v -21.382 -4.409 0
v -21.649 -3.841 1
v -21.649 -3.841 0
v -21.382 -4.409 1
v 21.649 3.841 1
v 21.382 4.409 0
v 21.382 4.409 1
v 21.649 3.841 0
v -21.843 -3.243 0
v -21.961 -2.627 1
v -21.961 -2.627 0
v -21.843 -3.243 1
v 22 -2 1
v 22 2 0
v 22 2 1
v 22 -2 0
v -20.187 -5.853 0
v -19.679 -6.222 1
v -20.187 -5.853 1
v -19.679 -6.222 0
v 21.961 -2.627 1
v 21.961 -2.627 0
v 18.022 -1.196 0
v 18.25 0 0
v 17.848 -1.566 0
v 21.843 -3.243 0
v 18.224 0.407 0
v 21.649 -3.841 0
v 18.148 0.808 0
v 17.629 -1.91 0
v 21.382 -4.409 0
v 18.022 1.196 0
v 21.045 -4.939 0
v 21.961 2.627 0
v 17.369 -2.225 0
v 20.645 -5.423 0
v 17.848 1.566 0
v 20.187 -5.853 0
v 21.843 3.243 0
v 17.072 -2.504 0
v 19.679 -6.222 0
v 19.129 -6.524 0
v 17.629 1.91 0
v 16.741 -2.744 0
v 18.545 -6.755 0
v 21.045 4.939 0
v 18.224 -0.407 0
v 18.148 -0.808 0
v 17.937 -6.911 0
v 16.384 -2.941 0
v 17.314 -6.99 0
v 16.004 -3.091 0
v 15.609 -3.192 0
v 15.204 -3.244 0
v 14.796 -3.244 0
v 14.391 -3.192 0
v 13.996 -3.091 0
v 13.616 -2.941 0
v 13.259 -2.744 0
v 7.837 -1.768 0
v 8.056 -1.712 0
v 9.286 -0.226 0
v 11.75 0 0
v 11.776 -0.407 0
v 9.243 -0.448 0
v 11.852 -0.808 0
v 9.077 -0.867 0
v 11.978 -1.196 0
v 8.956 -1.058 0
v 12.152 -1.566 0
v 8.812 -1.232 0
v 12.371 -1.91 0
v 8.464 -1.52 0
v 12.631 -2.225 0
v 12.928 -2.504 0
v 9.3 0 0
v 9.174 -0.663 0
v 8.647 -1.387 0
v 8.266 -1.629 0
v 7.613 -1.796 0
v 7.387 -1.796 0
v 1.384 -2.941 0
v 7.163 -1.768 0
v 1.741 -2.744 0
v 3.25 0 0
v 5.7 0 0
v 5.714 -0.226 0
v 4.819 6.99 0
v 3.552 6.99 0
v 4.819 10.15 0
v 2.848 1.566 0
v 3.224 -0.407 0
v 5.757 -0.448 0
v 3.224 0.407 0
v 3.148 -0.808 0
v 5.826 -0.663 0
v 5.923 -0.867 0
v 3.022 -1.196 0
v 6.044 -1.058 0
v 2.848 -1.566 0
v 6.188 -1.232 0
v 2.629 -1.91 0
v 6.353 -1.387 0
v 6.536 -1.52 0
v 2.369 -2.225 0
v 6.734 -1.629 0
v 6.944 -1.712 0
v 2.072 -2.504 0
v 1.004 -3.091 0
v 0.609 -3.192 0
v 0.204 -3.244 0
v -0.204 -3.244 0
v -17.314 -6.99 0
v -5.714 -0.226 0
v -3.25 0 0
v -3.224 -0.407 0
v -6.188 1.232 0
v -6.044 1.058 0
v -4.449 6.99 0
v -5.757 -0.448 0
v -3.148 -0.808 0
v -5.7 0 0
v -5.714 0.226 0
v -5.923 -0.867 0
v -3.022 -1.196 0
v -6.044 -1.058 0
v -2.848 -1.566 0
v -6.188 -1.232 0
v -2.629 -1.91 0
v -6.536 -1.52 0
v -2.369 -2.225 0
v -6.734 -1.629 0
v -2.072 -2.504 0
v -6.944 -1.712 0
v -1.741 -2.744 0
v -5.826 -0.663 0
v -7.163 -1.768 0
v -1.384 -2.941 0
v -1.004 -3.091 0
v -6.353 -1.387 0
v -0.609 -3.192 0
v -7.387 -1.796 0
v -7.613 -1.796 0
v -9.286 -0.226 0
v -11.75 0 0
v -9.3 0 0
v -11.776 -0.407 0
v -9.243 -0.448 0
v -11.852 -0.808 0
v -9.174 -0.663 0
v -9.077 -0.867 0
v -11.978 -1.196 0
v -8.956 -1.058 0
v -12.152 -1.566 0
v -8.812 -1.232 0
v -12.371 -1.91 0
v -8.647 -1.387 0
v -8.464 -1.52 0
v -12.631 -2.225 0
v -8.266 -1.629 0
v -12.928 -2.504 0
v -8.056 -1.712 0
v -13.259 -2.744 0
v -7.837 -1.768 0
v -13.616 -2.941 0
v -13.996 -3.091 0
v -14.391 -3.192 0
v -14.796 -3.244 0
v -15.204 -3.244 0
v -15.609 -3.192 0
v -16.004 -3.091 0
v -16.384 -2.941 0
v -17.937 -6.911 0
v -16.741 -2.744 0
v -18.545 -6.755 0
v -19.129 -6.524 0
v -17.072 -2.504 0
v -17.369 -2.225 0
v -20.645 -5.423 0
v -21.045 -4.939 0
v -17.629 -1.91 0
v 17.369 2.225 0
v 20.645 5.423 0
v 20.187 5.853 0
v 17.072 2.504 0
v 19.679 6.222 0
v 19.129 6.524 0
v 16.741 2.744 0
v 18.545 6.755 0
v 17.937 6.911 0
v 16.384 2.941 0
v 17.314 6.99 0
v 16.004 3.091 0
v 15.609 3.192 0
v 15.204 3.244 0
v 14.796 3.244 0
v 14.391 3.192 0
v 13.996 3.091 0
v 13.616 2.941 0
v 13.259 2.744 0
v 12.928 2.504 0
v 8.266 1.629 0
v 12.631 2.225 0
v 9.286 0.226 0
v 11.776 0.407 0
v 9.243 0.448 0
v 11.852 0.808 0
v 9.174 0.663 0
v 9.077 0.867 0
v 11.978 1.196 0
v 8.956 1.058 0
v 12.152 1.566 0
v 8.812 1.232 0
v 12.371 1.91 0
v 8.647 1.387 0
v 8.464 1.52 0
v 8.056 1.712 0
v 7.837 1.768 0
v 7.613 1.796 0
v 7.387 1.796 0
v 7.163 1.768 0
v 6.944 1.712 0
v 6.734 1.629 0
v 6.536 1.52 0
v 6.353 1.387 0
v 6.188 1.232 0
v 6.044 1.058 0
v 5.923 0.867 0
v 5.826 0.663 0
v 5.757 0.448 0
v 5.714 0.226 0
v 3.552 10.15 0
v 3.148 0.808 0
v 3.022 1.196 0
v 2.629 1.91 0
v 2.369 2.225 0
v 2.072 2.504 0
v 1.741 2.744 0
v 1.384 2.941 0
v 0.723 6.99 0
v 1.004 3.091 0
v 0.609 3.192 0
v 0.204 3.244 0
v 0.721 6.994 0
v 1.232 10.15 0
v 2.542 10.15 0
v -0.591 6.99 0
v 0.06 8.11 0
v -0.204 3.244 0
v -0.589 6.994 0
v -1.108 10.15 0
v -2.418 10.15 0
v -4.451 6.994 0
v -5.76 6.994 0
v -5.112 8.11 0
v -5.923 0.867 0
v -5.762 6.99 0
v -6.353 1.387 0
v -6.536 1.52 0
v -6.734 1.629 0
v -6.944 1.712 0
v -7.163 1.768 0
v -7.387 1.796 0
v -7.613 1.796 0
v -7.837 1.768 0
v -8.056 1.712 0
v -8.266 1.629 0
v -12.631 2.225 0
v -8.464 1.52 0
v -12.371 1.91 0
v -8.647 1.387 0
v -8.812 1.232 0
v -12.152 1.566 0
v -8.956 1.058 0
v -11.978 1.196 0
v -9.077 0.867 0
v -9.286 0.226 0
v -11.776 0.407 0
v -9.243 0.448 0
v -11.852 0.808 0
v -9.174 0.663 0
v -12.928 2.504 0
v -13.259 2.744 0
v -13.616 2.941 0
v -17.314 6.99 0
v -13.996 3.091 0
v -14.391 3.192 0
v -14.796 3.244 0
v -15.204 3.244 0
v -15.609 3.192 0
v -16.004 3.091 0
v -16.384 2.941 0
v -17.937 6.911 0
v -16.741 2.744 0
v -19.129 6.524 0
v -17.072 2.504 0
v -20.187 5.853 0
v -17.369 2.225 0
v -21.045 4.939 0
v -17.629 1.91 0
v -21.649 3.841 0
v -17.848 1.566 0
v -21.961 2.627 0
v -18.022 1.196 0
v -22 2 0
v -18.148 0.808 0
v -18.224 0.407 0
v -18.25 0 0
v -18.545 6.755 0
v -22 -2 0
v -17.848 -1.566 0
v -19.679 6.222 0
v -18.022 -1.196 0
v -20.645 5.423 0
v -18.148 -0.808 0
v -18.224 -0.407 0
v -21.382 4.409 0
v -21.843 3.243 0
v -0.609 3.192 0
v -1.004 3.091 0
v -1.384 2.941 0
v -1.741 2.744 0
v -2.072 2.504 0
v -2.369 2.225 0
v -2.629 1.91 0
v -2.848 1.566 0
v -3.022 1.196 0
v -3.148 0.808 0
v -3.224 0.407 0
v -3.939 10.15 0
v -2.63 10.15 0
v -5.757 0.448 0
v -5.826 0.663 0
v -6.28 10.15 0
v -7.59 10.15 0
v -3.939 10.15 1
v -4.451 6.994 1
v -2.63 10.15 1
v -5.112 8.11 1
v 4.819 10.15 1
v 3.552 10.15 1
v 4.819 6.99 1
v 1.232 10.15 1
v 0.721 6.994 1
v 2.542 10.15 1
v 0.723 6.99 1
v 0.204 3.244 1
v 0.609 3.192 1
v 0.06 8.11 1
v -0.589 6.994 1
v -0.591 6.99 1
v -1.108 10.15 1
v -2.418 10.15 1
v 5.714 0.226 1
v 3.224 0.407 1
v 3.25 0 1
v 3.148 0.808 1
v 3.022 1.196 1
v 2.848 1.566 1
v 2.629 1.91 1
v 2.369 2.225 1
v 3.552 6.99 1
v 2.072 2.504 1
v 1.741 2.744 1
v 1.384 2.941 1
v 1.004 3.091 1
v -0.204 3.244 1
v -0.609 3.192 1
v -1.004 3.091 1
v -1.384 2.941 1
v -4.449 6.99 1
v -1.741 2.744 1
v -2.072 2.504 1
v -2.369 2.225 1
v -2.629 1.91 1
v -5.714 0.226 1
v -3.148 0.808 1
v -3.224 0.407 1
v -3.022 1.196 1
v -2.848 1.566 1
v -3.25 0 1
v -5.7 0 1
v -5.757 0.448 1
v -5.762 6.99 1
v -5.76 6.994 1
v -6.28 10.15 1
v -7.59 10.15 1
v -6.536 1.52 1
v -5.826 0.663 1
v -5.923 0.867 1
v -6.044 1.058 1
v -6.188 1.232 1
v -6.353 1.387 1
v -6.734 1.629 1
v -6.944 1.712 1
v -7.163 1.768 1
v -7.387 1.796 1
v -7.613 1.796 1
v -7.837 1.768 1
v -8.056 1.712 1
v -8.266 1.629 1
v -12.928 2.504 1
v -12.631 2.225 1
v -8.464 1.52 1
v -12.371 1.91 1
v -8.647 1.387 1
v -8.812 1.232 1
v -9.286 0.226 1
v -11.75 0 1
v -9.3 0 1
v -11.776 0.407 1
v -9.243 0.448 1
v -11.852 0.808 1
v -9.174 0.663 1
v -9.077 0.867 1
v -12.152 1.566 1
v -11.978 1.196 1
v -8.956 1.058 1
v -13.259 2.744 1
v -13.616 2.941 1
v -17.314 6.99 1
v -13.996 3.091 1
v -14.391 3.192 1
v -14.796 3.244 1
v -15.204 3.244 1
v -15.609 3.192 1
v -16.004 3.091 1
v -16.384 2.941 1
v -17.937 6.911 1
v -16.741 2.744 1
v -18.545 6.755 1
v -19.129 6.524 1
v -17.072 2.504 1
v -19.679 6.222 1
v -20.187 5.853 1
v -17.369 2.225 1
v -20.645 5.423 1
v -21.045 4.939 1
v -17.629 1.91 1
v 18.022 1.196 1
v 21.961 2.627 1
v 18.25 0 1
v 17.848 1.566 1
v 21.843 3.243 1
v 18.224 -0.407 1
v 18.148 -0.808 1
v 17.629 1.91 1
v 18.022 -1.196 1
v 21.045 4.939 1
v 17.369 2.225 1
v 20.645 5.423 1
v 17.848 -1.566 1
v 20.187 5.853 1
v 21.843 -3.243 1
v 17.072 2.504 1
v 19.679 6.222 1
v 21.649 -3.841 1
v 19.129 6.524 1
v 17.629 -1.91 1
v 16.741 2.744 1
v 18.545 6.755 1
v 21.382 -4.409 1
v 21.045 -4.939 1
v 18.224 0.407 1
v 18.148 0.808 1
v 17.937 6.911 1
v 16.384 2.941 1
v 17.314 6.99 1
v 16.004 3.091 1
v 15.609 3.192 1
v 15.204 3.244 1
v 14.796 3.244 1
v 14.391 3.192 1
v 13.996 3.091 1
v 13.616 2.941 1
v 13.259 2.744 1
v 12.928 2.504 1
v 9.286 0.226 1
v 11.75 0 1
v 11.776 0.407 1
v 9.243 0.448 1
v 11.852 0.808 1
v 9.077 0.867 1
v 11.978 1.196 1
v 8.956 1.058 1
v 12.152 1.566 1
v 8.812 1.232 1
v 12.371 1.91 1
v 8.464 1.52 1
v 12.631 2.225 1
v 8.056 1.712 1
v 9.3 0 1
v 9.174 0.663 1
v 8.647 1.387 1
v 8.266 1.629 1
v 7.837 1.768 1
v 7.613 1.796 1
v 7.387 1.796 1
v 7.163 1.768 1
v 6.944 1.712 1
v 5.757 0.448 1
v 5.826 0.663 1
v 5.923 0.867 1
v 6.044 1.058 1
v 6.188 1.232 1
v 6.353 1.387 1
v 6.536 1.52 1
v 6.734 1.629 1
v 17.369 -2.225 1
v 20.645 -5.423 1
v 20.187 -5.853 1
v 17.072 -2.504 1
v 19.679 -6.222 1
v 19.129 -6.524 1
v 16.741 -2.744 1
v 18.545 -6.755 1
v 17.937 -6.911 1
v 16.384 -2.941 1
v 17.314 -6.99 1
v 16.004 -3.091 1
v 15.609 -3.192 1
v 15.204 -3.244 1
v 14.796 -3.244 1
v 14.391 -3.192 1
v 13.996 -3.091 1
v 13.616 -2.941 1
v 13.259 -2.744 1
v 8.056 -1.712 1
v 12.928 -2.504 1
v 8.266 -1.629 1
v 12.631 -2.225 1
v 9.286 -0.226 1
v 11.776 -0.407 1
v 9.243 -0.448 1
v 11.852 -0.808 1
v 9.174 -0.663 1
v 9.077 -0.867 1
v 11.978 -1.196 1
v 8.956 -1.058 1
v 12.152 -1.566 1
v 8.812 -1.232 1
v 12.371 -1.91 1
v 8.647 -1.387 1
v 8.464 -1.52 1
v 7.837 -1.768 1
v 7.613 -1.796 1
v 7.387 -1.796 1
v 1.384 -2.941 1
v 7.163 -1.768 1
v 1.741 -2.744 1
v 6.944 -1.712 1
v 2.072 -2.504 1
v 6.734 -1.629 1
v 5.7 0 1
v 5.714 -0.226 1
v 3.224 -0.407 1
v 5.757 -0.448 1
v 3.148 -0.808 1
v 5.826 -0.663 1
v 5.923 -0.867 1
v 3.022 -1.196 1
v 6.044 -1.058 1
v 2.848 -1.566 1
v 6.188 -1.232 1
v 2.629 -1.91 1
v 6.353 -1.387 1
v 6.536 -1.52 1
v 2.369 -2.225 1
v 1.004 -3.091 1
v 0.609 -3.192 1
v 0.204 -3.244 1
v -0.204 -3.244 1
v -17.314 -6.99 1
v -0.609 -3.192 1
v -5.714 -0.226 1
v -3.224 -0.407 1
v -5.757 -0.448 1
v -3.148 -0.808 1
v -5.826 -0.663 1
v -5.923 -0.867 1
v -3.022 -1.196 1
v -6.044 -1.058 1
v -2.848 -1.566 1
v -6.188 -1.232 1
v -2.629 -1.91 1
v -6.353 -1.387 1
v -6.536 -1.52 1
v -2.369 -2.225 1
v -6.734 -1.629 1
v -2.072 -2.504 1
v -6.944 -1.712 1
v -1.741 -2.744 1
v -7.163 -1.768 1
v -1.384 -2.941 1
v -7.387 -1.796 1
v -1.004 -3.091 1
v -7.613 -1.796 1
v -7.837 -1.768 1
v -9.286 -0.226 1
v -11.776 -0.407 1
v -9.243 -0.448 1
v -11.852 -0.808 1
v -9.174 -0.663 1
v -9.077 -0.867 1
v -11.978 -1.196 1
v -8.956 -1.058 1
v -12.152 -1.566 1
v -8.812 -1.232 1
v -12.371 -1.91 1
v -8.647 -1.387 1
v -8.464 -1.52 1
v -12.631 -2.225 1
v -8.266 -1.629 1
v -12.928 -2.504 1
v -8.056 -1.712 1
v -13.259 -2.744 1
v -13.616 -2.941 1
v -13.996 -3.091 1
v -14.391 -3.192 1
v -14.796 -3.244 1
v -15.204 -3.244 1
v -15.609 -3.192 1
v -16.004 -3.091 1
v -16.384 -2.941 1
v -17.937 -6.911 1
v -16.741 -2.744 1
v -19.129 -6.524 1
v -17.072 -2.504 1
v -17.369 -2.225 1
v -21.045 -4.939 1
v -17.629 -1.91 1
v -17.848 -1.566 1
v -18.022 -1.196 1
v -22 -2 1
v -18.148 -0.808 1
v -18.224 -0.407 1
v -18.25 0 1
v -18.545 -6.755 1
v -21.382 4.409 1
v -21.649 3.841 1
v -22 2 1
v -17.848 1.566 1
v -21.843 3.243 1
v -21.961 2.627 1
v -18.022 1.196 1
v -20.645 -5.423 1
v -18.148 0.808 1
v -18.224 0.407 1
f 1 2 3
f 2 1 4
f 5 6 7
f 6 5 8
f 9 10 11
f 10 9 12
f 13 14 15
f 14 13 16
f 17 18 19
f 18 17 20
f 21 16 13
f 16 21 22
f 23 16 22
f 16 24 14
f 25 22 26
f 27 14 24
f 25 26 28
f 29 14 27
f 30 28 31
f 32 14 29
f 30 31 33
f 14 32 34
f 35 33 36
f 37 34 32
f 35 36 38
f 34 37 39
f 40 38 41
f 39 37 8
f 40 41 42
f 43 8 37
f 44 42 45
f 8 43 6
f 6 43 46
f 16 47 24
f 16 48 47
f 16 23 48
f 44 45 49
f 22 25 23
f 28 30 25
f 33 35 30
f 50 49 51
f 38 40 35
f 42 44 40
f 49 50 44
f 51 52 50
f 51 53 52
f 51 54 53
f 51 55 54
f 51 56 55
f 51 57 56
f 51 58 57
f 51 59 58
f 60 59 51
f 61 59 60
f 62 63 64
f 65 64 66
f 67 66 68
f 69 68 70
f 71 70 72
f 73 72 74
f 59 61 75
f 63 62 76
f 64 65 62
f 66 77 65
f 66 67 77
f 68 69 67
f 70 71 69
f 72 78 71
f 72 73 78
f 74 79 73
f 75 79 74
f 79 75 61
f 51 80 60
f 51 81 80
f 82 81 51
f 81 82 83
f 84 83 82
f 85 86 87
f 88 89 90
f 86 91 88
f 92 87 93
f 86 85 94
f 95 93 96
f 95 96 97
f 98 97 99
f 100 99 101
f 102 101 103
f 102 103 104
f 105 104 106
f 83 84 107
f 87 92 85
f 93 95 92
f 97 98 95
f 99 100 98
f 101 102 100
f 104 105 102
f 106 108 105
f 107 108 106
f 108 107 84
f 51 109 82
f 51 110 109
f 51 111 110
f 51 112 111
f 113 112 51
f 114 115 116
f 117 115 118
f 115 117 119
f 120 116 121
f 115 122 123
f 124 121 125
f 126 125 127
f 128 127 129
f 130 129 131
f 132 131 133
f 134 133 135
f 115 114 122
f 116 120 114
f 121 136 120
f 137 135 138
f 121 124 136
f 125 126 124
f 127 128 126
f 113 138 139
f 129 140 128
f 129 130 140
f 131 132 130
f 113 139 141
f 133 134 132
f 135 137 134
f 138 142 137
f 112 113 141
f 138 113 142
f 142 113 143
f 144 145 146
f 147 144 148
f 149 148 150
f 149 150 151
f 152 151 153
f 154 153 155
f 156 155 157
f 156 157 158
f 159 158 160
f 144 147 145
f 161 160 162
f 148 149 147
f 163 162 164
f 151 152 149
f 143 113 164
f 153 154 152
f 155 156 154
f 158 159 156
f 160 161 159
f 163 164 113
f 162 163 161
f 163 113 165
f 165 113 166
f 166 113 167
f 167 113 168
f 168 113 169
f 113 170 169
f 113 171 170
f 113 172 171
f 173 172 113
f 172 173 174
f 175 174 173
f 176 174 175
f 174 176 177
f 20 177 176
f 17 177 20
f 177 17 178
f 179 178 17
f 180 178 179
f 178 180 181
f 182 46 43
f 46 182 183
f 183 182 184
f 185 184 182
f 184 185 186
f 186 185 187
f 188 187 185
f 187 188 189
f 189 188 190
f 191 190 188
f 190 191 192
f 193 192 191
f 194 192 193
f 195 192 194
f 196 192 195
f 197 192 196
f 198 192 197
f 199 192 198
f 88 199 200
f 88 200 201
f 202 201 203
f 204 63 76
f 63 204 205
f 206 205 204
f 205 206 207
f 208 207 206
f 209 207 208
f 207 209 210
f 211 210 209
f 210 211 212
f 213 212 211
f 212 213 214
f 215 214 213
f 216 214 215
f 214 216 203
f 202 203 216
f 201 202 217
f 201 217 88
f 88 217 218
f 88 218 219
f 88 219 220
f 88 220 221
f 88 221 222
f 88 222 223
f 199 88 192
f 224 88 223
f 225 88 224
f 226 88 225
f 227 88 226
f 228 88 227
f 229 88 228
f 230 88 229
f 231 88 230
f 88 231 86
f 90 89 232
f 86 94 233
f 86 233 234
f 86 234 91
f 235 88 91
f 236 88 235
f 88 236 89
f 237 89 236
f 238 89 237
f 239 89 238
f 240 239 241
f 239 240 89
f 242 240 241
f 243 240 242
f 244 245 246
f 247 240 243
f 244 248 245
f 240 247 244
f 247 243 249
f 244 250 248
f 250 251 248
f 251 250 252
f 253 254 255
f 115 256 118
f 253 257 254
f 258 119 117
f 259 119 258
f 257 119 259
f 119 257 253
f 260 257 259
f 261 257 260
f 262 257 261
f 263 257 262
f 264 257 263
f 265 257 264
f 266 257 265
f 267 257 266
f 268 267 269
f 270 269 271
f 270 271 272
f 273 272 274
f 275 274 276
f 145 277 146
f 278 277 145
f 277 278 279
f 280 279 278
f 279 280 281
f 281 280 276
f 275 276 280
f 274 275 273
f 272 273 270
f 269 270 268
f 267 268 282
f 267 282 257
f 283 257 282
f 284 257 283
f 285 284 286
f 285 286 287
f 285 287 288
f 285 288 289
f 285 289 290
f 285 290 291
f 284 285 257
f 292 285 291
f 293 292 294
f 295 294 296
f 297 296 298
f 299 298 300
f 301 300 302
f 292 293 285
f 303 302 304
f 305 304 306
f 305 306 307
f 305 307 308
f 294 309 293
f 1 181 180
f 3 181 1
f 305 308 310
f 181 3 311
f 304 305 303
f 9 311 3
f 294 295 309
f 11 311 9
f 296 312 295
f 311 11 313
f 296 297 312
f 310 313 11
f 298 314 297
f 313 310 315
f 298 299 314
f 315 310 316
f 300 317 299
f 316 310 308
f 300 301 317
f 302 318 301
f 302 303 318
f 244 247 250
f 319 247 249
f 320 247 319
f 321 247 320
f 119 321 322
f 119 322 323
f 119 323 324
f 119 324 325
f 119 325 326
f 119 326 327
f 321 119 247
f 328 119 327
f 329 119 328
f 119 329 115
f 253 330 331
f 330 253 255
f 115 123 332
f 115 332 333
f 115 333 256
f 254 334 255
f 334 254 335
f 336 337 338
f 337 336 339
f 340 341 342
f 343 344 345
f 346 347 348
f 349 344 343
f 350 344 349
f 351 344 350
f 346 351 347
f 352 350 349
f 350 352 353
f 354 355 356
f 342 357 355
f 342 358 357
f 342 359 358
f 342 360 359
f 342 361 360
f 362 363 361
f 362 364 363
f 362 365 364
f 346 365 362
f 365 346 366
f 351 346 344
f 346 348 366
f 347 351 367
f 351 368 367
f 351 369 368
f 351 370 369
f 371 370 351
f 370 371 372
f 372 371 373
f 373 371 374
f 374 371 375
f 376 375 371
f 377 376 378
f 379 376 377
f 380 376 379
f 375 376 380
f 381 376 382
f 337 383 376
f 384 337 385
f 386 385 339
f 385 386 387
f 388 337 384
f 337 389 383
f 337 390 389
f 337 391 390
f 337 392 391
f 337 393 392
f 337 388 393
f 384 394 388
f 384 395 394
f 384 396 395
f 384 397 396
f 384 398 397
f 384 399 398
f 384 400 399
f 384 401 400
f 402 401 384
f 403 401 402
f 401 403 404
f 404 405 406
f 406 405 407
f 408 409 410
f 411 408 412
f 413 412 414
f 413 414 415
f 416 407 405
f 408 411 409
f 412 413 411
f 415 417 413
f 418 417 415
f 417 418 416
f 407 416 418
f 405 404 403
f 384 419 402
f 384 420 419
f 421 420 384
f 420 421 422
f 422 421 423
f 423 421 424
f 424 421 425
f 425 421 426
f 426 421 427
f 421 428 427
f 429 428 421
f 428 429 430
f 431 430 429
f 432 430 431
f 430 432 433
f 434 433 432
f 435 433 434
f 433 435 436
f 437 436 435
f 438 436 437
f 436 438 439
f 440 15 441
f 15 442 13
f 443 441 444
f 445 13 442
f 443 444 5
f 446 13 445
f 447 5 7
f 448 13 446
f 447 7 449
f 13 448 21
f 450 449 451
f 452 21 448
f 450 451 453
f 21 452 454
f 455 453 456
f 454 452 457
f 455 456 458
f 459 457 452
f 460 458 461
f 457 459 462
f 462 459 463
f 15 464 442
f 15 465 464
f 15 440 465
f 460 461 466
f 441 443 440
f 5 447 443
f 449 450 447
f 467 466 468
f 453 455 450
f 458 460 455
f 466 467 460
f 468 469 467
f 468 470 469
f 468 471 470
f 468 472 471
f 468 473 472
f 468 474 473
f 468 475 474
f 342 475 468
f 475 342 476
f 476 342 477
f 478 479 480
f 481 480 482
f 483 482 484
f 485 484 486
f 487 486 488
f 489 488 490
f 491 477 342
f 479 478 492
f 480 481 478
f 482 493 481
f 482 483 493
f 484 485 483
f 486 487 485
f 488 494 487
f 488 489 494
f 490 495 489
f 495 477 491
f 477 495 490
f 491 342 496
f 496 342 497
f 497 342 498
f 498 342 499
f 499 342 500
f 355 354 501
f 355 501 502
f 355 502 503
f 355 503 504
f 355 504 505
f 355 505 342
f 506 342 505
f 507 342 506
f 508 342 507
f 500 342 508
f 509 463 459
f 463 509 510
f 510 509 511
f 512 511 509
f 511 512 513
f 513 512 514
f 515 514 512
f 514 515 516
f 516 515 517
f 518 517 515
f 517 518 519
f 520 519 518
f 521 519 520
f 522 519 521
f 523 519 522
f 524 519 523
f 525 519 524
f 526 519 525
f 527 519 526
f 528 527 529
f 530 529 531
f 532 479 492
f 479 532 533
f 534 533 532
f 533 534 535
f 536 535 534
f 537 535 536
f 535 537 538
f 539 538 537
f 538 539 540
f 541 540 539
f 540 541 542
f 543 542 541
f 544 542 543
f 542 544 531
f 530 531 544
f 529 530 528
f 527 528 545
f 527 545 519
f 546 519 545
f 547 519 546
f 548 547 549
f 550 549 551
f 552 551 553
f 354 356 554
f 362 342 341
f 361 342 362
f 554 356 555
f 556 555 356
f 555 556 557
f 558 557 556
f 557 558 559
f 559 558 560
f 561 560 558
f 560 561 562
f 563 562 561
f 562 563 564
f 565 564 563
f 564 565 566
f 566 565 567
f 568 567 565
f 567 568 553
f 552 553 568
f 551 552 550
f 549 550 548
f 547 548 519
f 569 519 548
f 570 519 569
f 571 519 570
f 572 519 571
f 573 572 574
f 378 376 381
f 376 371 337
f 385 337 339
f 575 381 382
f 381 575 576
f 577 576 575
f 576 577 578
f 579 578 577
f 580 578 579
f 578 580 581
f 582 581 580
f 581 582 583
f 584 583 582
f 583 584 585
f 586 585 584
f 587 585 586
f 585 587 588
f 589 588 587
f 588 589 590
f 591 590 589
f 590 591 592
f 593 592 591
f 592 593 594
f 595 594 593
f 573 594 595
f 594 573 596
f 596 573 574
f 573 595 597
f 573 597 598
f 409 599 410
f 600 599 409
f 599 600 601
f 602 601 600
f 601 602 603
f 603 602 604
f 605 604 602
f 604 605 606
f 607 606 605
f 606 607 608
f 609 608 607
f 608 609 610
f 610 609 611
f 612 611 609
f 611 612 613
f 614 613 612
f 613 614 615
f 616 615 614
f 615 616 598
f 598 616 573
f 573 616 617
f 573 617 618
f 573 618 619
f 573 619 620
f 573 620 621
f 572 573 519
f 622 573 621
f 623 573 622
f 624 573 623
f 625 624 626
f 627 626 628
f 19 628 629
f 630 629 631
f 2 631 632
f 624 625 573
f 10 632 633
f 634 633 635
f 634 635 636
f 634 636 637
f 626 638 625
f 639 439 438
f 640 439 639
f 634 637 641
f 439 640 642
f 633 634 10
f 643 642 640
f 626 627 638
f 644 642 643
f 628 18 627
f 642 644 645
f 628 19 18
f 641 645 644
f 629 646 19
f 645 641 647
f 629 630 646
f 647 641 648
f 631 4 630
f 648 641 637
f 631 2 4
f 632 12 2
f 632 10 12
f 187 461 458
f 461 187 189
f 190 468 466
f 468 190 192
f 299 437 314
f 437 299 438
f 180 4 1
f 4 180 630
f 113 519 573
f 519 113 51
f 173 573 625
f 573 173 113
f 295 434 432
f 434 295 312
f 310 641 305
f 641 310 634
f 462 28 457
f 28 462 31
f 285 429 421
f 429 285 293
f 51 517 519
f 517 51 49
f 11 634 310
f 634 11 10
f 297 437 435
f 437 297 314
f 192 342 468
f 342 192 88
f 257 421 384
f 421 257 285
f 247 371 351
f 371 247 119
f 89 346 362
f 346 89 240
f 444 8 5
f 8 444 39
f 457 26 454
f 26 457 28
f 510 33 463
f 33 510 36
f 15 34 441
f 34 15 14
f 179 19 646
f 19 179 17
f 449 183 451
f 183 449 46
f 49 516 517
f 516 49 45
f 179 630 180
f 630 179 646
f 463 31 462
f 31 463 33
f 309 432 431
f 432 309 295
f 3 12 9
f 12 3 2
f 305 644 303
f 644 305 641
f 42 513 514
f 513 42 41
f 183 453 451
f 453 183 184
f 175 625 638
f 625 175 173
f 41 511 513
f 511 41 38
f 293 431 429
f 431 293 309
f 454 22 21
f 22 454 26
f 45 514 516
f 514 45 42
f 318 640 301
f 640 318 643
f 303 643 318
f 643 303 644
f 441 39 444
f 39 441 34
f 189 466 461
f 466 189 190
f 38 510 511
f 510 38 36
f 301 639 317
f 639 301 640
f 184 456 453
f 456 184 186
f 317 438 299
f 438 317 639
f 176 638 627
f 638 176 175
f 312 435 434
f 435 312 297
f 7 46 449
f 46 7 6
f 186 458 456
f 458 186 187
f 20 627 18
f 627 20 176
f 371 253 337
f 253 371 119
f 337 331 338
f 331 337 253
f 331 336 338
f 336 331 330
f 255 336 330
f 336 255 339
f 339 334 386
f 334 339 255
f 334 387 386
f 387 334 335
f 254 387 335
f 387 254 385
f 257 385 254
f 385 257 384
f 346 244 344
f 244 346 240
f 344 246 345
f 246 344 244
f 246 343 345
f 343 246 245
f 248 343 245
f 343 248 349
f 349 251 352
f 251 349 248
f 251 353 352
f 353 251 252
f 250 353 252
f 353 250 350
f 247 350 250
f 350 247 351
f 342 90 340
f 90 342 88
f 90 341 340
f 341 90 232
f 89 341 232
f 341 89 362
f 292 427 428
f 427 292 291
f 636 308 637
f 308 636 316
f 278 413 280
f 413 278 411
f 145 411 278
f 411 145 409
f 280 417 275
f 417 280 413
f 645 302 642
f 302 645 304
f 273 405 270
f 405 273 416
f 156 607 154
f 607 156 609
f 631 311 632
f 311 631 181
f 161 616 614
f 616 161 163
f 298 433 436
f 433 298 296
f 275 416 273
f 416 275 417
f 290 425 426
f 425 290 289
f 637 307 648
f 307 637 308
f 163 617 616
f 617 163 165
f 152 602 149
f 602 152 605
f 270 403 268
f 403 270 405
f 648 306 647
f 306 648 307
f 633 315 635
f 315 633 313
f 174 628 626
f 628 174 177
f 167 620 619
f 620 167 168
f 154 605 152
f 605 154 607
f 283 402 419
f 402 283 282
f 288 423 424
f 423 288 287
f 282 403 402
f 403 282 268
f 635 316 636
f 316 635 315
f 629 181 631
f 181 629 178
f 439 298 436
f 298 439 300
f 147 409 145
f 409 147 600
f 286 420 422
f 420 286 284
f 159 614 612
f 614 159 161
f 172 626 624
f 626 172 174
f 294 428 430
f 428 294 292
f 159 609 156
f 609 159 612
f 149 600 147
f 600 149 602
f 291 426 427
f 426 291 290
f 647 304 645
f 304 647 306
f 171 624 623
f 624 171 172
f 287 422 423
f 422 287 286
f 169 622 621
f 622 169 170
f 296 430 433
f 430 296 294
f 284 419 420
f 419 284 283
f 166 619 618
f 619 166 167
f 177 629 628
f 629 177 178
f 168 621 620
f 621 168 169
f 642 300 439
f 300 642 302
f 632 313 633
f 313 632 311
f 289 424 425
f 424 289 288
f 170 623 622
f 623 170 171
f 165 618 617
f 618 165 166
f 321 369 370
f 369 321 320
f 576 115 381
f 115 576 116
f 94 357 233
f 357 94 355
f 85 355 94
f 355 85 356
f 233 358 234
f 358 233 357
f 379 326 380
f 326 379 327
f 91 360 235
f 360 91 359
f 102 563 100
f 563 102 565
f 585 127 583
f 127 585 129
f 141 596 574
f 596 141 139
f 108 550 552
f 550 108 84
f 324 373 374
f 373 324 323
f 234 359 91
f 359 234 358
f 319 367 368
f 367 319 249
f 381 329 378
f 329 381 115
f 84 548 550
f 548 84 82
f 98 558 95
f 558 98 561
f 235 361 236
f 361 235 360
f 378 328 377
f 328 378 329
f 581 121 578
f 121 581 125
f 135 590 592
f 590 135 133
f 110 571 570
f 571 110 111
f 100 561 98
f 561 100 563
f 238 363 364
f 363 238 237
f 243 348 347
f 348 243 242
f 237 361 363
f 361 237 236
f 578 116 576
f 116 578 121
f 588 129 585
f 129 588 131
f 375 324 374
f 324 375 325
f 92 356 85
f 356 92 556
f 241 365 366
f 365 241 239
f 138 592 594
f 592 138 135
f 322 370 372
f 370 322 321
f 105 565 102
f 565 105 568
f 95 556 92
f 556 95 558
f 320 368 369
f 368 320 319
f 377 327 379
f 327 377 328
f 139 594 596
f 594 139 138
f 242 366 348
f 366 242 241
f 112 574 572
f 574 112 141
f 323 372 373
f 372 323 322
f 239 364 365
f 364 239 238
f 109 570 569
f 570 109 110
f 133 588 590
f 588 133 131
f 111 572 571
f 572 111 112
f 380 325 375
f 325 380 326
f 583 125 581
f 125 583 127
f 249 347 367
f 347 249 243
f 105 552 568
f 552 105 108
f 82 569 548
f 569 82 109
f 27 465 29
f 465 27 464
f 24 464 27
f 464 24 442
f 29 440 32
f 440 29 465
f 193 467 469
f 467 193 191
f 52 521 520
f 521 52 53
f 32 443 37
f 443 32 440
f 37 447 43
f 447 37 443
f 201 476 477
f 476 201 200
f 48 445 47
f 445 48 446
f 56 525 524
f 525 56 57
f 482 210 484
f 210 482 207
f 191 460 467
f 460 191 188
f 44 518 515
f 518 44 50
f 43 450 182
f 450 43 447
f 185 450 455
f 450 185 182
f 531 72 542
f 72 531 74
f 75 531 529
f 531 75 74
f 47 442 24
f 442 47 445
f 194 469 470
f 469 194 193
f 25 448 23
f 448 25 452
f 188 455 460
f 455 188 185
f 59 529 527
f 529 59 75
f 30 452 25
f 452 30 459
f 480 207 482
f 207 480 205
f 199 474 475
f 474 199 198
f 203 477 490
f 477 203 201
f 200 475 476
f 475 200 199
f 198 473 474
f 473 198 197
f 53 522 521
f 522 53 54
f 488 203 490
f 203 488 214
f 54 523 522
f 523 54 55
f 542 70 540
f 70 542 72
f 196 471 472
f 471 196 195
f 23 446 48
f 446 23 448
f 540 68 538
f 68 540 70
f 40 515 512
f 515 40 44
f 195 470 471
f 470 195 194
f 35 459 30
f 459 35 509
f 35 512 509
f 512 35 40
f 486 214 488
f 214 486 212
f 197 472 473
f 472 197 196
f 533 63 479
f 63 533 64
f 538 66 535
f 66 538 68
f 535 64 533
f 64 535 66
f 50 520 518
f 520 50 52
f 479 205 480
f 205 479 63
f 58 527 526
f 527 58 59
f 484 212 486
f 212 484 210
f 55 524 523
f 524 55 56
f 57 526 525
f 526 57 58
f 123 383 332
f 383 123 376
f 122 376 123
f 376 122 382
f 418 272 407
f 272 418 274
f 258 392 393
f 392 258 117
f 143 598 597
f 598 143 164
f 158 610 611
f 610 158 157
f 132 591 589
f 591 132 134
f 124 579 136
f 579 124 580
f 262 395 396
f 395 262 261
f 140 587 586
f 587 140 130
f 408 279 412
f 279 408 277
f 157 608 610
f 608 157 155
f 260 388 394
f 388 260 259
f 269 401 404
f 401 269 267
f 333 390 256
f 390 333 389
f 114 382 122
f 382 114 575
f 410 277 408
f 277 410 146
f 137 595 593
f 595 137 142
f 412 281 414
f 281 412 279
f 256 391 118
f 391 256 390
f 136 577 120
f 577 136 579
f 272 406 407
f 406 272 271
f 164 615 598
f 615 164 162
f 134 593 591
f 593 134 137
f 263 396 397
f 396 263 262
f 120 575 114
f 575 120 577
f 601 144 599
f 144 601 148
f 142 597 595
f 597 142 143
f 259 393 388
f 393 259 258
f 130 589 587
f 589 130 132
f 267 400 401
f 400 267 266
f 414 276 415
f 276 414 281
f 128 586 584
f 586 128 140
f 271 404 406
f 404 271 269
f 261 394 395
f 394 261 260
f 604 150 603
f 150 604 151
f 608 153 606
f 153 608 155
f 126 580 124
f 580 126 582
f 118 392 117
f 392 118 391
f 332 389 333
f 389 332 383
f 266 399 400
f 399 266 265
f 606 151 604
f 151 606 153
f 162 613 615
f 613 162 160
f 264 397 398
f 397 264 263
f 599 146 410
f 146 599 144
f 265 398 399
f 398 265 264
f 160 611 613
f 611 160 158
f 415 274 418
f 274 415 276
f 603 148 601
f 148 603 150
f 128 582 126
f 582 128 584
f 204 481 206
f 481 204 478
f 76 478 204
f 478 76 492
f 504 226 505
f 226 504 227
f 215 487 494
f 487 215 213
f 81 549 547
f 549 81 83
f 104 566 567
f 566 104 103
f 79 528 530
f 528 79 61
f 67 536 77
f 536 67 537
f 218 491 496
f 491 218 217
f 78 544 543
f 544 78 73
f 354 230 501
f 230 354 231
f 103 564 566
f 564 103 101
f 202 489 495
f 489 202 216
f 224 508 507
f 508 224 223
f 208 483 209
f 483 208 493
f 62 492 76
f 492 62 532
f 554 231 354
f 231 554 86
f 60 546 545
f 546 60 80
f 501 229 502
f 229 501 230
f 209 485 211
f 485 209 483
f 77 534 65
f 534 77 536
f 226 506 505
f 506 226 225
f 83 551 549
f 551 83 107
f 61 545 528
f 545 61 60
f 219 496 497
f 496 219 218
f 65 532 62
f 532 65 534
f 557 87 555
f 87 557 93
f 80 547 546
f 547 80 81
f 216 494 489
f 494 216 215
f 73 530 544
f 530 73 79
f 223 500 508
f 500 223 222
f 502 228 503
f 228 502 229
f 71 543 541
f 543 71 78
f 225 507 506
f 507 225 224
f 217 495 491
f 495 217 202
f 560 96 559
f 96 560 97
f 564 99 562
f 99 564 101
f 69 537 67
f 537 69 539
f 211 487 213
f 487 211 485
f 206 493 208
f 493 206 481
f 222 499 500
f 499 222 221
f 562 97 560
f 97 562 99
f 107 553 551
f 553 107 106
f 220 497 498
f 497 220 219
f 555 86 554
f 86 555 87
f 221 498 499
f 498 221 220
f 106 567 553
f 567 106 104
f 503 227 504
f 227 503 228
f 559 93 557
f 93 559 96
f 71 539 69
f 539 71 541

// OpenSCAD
$fn = 50;


difference() {
	union() {
		hull() {
			translate(v = [-17.0000000000, 2.0000000000, 0]) {
				cylinder(h = 1, r = 5);
			}
			translate(v = [17.0000000000, 2.0000000000, 0]) {
				cylinder(h = 1, r = 5);
			}
			translate(v = [-17.0000000000, -2.0000000000, 0]) {
				cylinder(h = 1, r = 5);
			}
			translate(v = [17.0000000000, -2.0000000000, 0]) {
				cylinder(h = 1, r = 5);
			}
		}
		translate(v = [0, 10.0000000000, 0]) {
			linear_extrude(height = 1) {
				text(font = "DejaVu Sans Mono:style=Bold", halign = "center", size = 6.3333333333, text = "XXL", valign = "top");
			}
		}
	}
	union() {
		translate(v = [-15.0000000000, 0.0000000000, 0]) {
			translate(v = [0, 0, -100]) {
				cylinder(h = 200, r = 3.2500000000);
			}
		}
		translate(v = [0, 0, -100]) {
			cylinder(h = 200, r = 3.2500000000);
		}
		translate(v = [15.0000000000, 0.0000000000, 0]) {
			translate(v = [0, 0, -100]) {
				cylinder(h = 200, r = 3.2500000000);
			}
		}
		translate(v = [-15.0000000000, 0.0000000000, 0]) {
			translate(v = [0, 0, -100]) {
				cylinder(h = 200, r = 1.8000000000);
			}
		}
		translate(v = [-7.5000000000, 0.0000000000, 0]) {
			translate(v = [0, 0, -100]) {
				cylinder(h = 200, r = 1.8000000000);
			}
		}
		translate(v = [0, 0, -100]) {
			cylinder(h = 200, r = 1.8000000000);
		}
		translate(v = [7.5000000000, 0.0000000000, 0]) {
			translate(v = [0, 0, -100]) {
				cylinder(h = 200, r = 1.8000000000);
			}
		}
		translate(v = [15.0000000000, 0.0000000000, 0]) {
			translate(v = [0, 0, -100]) {
				cylinder(h = 200, r = 1.8000000000);
			}
		}
	}
}
